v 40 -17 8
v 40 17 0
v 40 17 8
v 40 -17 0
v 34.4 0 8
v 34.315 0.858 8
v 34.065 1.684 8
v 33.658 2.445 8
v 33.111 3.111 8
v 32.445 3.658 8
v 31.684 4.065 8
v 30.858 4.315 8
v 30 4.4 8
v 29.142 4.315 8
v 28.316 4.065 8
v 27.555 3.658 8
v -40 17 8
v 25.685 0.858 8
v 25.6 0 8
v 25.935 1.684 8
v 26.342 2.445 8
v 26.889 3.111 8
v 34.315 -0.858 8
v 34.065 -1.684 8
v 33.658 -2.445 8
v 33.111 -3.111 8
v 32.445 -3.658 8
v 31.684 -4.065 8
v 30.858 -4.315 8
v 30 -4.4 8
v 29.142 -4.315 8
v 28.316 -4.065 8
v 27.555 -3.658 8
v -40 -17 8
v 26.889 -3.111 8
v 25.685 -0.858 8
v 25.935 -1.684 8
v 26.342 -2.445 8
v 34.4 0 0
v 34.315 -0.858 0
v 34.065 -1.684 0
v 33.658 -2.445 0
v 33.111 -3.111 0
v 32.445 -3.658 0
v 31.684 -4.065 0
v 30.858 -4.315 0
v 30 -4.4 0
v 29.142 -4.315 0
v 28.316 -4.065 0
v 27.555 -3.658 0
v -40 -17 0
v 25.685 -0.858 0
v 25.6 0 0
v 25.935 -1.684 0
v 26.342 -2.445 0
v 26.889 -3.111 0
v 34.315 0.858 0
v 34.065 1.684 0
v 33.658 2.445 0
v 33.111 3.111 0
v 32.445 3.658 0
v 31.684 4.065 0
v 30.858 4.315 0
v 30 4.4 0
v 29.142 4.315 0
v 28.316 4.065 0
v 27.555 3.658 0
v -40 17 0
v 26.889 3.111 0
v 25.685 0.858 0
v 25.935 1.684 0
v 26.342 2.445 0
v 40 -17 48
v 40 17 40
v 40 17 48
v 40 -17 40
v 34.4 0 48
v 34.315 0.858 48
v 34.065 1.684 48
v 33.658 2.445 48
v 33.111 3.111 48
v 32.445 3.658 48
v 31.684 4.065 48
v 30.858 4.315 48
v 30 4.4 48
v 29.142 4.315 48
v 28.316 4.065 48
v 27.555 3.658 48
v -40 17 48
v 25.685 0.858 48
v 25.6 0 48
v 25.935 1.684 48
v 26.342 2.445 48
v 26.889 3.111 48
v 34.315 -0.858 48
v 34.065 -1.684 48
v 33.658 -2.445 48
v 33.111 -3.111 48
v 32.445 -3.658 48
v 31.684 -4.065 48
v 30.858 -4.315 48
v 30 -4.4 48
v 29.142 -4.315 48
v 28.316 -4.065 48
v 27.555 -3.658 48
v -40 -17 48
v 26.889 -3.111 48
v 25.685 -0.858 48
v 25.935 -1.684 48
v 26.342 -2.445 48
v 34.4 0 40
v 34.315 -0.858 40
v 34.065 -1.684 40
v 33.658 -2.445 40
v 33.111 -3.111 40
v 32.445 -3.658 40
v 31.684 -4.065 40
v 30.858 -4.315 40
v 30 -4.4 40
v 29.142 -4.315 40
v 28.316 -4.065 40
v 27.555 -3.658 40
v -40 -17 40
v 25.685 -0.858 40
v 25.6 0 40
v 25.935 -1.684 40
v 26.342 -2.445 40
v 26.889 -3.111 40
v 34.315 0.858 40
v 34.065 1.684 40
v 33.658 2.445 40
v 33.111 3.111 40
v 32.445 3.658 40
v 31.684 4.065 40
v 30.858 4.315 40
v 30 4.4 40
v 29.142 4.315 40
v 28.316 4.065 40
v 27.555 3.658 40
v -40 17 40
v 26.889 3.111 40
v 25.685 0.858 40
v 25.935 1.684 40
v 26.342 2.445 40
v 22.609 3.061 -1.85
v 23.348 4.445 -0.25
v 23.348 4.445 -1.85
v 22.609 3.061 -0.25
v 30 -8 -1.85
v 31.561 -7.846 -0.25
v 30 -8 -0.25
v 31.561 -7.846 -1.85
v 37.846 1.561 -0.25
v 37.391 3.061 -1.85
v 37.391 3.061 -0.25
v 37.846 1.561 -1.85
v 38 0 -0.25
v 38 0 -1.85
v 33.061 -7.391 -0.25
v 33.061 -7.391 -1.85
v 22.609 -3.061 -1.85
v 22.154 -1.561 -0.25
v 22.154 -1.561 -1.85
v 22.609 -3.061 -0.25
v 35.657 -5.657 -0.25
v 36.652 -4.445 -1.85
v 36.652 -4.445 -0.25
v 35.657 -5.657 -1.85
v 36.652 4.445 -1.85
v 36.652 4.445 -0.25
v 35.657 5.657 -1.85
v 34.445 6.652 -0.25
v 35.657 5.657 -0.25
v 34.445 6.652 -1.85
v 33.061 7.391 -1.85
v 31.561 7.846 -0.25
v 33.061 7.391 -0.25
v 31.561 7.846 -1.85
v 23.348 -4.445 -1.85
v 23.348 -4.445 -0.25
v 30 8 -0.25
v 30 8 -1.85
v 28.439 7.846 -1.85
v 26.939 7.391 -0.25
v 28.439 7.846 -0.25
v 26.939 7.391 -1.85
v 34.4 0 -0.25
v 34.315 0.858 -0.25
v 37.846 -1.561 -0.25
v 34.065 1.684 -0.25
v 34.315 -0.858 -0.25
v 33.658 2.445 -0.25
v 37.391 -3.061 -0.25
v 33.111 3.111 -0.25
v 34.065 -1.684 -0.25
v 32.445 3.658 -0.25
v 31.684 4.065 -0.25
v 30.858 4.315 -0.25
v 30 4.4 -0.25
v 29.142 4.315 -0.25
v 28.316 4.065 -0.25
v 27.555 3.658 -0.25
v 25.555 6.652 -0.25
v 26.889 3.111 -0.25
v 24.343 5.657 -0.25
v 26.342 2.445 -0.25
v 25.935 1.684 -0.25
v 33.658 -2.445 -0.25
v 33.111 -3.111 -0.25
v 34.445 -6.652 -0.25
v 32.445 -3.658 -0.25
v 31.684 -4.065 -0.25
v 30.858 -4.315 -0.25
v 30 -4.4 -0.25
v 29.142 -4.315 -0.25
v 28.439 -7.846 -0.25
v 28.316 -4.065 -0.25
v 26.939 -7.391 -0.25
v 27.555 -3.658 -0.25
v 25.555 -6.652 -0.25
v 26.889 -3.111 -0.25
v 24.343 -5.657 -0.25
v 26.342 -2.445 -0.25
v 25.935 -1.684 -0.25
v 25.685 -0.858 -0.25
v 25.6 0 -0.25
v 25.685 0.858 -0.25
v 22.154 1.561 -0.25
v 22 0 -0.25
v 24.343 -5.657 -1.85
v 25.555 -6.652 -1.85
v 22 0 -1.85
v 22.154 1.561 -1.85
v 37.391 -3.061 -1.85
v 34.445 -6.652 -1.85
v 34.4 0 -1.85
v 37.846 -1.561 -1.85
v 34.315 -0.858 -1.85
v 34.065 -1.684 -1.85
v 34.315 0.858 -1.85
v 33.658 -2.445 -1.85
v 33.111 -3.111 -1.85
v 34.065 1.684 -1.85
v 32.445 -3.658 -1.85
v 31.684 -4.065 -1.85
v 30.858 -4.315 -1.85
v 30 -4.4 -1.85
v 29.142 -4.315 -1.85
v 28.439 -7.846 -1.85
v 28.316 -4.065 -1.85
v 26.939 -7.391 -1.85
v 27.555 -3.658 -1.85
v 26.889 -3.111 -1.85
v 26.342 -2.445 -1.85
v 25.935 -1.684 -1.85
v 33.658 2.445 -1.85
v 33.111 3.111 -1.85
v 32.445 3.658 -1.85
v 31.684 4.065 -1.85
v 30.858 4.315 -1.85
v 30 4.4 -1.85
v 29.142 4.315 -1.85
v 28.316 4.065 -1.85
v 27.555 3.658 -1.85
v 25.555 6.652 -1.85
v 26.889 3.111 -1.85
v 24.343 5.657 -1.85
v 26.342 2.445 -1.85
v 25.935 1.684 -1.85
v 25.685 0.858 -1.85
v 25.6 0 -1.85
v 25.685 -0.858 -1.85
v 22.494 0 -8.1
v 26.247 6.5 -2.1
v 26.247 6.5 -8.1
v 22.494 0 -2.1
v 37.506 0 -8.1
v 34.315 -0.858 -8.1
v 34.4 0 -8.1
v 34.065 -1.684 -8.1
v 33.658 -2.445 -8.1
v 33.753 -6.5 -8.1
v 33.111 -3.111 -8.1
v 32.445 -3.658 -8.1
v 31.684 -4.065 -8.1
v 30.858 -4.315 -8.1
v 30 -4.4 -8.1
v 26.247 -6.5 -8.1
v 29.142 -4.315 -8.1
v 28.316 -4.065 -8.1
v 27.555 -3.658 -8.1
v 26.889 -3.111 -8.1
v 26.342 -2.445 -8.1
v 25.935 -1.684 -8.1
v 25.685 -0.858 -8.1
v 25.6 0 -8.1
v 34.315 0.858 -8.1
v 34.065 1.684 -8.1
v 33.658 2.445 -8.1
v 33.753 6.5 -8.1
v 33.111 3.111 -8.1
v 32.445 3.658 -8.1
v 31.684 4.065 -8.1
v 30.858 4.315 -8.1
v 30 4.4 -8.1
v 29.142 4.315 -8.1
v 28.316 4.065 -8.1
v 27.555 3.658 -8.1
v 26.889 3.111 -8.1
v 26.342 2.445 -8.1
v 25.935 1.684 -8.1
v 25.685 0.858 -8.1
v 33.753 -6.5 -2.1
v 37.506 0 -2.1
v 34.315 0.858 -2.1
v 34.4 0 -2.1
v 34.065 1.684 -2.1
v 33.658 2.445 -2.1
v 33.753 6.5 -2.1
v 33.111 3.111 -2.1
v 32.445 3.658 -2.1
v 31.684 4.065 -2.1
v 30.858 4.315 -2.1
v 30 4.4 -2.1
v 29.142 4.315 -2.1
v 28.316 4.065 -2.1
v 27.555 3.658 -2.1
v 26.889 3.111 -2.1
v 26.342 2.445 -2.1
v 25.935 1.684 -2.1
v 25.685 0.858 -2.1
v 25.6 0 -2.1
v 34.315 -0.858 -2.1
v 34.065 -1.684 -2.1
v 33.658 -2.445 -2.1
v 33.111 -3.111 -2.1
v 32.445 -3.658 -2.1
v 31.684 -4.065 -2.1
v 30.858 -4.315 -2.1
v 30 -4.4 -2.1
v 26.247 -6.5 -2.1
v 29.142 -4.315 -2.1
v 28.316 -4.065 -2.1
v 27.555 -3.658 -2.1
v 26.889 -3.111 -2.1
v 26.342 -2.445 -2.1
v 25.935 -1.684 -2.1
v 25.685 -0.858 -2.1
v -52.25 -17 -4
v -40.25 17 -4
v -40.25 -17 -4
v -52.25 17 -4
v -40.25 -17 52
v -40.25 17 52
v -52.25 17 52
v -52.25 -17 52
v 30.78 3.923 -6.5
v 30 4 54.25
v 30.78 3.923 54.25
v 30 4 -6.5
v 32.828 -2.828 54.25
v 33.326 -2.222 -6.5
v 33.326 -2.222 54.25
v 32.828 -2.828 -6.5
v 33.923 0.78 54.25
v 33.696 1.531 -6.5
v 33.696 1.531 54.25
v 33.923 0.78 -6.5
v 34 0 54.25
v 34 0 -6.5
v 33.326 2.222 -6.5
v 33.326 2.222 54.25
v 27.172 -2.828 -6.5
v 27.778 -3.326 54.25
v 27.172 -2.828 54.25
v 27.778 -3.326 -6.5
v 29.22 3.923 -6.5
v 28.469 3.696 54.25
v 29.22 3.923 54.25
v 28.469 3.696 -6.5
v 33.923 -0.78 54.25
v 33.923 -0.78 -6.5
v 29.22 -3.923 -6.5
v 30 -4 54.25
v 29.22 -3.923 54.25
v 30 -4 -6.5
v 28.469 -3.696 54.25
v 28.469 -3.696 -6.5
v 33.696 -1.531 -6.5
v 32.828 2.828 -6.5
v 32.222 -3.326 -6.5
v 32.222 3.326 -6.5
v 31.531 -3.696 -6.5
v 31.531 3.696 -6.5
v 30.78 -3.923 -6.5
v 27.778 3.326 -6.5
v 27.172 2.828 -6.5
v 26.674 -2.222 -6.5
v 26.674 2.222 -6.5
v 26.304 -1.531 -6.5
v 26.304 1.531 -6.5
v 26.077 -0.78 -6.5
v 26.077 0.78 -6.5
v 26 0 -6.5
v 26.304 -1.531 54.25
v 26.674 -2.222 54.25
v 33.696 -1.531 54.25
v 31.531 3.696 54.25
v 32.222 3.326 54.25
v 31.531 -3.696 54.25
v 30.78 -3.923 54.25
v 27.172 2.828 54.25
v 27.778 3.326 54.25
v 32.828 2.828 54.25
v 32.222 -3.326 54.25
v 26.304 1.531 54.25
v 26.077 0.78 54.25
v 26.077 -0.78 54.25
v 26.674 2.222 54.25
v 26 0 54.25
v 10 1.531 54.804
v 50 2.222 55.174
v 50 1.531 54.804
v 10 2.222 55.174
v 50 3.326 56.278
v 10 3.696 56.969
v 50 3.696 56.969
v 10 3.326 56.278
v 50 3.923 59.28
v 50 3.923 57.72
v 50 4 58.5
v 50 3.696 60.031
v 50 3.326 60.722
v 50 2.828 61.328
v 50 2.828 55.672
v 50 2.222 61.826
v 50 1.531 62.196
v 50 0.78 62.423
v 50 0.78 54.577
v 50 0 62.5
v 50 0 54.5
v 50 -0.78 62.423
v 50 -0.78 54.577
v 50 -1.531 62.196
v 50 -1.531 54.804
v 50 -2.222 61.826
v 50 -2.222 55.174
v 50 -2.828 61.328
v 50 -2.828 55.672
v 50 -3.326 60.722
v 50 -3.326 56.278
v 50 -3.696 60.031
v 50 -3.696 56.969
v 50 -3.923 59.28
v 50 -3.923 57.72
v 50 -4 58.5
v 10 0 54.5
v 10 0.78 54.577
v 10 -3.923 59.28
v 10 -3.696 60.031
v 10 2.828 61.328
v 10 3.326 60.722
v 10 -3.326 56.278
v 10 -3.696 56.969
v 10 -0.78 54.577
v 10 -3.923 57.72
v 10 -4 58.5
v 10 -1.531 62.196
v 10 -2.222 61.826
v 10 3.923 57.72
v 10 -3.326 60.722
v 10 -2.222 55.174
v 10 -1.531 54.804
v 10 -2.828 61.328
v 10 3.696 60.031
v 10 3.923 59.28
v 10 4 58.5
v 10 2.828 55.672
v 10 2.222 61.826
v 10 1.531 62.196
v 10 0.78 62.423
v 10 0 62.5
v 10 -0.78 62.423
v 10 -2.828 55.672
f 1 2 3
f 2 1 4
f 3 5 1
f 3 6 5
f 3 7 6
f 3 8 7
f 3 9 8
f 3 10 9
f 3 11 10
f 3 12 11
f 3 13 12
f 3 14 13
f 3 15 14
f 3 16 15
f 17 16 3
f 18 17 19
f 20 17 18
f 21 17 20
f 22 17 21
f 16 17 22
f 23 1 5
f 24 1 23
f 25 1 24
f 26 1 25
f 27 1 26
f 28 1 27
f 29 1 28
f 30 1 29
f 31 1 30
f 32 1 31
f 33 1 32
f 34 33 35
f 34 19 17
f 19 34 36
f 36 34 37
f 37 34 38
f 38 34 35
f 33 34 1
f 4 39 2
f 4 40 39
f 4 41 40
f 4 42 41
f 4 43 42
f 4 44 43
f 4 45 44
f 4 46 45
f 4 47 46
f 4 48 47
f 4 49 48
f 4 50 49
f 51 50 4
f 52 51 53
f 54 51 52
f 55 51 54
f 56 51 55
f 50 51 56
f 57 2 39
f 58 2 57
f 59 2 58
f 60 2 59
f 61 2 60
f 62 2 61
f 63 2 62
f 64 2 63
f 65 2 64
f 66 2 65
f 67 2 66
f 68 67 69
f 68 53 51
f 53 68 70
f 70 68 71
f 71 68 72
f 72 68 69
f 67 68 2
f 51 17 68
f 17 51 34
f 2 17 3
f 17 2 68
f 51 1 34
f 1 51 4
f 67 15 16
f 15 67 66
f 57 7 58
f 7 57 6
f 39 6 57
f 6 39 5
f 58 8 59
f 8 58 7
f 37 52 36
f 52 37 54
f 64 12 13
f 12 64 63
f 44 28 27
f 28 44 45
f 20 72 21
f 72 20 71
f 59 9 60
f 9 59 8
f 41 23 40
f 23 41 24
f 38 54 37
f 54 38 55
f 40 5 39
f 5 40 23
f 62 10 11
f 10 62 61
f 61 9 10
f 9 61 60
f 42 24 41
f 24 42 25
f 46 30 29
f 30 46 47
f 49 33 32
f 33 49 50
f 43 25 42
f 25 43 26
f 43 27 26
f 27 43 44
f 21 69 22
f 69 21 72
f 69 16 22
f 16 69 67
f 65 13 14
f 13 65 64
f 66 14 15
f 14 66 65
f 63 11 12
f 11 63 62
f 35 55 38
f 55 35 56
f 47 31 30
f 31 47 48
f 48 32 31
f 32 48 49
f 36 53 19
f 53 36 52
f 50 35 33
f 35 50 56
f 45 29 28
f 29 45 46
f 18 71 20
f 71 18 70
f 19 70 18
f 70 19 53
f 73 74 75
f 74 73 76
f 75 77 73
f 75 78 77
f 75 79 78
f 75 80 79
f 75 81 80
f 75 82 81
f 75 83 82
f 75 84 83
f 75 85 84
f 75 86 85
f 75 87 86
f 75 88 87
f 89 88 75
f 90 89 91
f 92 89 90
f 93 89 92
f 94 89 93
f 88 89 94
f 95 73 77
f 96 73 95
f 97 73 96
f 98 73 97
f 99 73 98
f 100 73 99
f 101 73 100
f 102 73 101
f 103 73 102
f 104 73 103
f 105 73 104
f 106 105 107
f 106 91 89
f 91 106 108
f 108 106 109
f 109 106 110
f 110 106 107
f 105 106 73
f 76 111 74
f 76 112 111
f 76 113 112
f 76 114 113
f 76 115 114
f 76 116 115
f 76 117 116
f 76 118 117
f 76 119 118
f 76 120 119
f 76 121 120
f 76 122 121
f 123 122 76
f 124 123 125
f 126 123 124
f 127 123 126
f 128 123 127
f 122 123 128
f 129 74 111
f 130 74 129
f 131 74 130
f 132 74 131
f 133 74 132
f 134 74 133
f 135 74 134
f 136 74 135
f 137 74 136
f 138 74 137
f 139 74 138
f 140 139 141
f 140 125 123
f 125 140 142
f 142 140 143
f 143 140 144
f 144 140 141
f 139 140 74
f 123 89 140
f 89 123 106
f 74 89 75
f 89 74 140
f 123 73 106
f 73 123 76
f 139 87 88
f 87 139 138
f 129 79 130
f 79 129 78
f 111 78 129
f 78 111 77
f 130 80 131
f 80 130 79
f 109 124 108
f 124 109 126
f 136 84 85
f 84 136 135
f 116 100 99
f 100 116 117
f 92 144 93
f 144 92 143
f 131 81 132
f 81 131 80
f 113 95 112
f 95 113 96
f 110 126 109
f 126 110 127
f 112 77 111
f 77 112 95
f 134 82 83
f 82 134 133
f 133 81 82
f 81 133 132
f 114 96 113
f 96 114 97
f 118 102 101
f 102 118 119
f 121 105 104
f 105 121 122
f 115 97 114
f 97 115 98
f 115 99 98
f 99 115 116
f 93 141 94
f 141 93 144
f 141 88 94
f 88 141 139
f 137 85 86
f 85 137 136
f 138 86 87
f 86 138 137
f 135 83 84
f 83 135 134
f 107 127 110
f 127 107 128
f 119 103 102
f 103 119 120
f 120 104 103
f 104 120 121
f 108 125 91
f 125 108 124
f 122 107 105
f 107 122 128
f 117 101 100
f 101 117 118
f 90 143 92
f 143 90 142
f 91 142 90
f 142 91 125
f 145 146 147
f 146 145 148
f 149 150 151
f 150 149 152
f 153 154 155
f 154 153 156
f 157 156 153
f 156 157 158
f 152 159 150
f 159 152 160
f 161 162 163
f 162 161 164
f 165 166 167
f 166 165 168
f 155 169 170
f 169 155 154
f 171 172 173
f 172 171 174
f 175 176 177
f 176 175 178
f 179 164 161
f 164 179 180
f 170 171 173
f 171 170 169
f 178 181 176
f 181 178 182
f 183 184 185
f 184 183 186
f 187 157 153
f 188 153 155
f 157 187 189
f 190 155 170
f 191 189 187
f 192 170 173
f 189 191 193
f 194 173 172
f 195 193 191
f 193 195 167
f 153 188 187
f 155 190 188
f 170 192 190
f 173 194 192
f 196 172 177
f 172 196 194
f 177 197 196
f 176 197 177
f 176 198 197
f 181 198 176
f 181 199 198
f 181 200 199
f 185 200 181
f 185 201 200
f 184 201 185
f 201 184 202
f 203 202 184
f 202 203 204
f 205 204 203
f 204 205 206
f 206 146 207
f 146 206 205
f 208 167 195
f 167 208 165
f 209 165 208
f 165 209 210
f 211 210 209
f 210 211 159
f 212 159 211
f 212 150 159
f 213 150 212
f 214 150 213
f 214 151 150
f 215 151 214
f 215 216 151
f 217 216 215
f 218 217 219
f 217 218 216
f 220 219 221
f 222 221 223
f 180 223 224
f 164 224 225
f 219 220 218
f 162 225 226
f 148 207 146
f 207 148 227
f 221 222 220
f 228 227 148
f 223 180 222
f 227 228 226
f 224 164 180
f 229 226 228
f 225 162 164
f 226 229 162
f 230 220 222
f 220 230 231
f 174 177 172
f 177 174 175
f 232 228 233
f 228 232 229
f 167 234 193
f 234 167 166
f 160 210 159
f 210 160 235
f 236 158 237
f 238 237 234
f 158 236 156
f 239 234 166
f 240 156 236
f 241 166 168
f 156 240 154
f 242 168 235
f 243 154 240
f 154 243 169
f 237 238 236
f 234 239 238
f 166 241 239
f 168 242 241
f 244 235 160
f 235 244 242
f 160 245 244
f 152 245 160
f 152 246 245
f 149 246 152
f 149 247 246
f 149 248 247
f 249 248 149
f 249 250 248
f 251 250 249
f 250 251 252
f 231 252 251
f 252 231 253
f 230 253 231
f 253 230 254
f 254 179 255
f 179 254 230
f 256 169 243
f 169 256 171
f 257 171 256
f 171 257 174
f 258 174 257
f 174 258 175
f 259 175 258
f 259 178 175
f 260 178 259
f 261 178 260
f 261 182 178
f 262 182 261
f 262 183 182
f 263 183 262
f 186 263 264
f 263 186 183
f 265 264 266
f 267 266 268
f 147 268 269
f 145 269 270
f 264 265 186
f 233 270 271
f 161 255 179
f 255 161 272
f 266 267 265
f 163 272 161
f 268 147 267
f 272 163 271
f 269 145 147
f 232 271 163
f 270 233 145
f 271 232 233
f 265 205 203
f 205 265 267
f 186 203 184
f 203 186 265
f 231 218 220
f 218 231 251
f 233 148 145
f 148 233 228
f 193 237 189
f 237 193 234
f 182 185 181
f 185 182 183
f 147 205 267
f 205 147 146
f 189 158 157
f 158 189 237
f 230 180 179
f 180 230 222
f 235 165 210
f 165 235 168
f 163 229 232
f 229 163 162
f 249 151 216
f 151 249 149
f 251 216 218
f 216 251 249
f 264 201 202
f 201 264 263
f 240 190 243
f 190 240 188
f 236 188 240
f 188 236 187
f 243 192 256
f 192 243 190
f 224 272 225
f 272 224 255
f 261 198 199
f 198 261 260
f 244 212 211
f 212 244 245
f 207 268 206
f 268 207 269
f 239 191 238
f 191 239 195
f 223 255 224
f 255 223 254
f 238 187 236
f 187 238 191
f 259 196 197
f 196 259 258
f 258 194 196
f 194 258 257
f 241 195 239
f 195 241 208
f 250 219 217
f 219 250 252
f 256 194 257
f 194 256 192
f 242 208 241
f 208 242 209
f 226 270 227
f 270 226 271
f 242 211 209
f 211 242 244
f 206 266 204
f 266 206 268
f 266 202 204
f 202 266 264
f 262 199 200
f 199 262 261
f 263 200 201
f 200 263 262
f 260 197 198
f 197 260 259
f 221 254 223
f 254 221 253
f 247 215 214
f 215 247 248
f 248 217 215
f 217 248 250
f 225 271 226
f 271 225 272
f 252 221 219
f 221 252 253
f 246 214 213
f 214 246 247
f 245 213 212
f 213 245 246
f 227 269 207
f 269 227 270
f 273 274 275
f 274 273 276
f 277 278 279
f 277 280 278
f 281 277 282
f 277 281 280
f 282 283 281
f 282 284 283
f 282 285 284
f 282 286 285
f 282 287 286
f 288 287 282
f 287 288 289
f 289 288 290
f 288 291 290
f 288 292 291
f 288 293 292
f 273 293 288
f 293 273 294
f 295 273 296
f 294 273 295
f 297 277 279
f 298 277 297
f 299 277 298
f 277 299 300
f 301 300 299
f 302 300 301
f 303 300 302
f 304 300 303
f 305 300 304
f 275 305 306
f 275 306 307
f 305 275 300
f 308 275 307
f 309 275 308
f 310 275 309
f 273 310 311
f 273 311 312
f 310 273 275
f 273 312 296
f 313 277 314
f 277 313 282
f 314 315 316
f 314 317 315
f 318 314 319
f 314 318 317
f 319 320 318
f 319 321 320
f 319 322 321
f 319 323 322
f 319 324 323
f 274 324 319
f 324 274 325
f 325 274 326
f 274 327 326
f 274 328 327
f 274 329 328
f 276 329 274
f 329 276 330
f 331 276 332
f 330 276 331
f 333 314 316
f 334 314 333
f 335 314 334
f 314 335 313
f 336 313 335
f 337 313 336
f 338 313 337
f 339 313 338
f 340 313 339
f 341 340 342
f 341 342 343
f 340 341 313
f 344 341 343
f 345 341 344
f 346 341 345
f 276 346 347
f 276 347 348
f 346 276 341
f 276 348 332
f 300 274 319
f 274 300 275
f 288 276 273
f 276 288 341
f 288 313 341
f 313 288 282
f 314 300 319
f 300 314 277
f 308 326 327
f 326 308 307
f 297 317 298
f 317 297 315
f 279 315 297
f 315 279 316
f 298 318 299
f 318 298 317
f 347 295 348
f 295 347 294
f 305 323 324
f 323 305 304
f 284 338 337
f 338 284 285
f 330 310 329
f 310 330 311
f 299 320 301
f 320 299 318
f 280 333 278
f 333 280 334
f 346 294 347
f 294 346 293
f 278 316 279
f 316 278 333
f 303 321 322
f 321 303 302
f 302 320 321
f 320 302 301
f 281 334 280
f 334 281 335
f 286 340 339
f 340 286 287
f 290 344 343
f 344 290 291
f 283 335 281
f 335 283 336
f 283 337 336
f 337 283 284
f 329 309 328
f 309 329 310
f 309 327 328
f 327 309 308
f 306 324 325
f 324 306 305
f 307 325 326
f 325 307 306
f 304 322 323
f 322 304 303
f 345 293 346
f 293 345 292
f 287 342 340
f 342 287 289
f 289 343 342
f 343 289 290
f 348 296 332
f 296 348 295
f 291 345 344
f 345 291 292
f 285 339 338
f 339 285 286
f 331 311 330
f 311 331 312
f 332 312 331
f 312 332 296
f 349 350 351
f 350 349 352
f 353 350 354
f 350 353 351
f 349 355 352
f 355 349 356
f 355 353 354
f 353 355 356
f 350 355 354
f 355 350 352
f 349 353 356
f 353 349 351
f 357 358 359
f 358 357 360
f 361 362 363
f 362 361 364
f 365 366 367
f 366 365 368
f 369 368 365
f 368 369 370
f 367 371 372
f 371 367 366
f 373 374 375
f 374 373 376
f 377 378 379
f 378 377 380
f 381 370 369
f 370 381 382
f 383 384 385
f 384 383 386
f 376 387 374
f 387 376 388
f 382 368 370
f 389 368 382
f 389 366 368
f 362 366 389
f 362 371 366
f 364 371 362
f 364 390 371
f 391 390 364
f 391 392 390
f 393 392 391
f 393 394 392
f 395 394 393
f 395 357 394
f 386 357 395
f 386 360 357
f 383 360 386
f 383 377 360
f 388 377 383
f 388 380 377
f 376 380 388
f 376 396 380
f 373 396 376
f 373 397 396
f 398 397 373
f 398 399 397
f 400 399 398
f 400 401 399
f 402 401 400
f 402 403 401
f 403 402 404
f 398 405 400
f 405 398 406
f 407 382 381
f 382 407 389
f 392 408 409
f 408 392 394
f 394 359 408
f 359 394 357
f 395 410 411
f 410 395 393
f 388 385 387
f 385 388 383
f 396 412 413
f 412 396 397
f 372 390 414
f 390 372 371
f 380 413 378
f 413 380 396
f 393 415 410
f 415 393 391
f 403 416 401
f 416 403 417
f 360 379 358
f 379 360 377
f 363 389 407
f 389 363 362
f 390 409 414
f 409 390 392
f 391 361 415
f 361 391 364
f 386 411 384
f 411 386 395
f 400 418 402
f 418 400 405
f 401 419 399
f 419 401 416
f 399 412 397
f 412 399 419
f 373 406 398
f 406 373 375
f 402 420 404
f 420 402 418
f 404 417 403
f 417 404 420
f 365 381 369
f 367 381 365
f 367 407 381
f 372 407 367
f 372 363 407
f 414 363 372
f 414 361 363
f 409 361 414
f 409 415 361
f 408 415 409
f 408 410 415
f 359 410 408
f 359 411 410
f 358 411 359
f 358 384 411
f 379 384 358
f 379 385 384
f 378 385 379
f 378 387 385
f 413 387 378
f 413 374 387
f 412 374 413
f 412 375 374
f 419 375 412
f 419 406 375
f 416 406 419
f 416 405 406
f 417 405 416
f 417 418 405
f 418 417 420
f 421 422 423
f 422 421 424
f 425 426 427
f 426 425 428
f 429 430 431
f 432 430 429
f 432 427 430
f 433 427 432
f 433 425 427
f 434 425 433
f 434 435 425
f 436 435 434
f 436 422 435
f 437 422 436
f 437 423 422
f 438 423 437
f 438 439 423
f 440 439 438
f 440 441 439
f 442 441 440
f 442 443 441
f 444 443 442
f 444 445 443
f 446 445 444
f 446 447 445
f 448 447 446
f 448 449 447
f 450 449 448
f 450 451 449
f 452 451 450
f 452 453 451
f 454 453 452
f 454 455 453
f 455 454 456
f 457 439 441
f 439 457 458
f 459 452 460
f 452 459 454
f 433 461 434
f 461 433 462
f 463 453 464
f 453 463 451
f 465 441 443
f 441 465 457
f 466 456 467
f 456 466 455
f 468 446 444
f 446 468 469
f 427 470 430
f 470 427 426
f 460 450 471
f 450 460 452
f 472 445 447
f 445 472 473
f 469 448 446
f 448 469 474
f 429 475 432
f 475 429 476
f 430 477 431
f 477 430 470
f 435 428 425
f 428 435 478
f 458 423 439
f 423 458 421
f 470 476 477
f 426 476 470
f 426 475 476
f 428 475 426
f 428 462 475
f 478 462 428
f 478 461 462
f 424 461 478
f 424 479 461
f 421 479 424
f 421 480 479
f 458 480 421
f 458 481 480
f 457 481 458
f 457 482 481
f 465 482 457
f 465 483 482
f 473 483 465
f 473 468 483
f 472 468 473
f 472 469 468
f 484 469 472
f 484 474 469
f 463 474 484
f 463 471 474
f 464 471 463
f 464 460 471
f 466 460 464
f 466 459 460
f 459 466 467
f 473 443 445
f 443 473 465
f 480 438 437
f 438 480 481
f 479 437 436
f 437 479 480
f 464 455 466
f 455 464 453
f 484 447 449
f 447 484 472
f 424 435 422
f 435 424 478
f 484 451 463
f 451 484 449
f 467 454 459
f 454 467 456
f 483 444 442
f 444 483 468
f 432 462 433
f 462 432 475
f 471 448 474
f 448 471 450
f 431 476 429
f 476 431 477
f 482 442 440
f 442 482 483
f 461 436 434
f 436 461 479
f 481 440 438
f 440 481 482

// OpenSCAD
$fn = 32;

// ------------------------------------------------------------------------
// C clamp: throat 40 mm, screw d8
// Every part is its own module, assembly() places every instance.
// ------------------------------------------------------------------------

// --- part 1 ---
module clamp_arm() {
  difference() {
    translate([-40, -17, 0]) cube([80, 34, 8]);
    translate([30, 0, -1]) cylinder(h = 10, d = 8.8);
  }
}

// --- part 2 ---
module clamp_spine() {
  difference() {
    translate([-28, -17, 0]) cube([56, 34, 12]);
  }
}

// --- part 3 ---
module clamp_screw() {
  translate([0, 0, -30.375]) cylinder(h = 60.75, d = 8);
}

// --- part 4 ---
module clamp_washer() {
  difference() {
      translate([0, 0, 0]) cylinder(h = 1.6, d = 16);
      translate([0, 0, -1]) cylinder(h = 3.6, d = 8.8);
    }
}

// --- part 5 ---
module clamp_nut() {
  difference() {
    linear_extrude(height = 6) polygon(points = [[7.506, 0], [3.753, 6.5], [-3.753, 6.5], [-7.506, 0], [-3.753, -6.5], [3.753, -6.5]]);
    translate([0, 0, -1]) cylinder(h = 8, d = 8.8);
  }
}

// --- part 6 ---
module tommy_bar() {
  translate([0, 0, -20]) cylinder(h = 40, d = 8);
}

// --- assembly ---
module assembly() {
  color([0.80, 0.24, 0.20]) translate([0, 0, 0]) rotate([0, 0, 0]) clamp_arm();
  color([0.20, 0.45, 0.75]) translate([0, 0, 40]) rotate([0, 0, 0]) clamp_arm();
  color([0.25, 0.62, 0.32]) translate([-52.25, 0, 24]) rotate([0, 90, 0]) clamp_spine();
  color([0.92, 0.70, 0.18]) translate([30, 0, 23.875]) rotate([0, 0, 0]) clamp_screw();
  color([0.58, 0.35, 0.70]) translate([30, 0, -1.85]) rotate([0, 0, 0]) clamp_washer();
  color([0.16, 0.66, 0.66]) translate([30, 0, -8.1]) rotate([0, 0, 0]) clamp_nut();
  color([0.85, 0.48, 0.18]) translate([30, 0, 58.5]) rotate([0, 90, 0]) tommy_bar();
}

assembly();
